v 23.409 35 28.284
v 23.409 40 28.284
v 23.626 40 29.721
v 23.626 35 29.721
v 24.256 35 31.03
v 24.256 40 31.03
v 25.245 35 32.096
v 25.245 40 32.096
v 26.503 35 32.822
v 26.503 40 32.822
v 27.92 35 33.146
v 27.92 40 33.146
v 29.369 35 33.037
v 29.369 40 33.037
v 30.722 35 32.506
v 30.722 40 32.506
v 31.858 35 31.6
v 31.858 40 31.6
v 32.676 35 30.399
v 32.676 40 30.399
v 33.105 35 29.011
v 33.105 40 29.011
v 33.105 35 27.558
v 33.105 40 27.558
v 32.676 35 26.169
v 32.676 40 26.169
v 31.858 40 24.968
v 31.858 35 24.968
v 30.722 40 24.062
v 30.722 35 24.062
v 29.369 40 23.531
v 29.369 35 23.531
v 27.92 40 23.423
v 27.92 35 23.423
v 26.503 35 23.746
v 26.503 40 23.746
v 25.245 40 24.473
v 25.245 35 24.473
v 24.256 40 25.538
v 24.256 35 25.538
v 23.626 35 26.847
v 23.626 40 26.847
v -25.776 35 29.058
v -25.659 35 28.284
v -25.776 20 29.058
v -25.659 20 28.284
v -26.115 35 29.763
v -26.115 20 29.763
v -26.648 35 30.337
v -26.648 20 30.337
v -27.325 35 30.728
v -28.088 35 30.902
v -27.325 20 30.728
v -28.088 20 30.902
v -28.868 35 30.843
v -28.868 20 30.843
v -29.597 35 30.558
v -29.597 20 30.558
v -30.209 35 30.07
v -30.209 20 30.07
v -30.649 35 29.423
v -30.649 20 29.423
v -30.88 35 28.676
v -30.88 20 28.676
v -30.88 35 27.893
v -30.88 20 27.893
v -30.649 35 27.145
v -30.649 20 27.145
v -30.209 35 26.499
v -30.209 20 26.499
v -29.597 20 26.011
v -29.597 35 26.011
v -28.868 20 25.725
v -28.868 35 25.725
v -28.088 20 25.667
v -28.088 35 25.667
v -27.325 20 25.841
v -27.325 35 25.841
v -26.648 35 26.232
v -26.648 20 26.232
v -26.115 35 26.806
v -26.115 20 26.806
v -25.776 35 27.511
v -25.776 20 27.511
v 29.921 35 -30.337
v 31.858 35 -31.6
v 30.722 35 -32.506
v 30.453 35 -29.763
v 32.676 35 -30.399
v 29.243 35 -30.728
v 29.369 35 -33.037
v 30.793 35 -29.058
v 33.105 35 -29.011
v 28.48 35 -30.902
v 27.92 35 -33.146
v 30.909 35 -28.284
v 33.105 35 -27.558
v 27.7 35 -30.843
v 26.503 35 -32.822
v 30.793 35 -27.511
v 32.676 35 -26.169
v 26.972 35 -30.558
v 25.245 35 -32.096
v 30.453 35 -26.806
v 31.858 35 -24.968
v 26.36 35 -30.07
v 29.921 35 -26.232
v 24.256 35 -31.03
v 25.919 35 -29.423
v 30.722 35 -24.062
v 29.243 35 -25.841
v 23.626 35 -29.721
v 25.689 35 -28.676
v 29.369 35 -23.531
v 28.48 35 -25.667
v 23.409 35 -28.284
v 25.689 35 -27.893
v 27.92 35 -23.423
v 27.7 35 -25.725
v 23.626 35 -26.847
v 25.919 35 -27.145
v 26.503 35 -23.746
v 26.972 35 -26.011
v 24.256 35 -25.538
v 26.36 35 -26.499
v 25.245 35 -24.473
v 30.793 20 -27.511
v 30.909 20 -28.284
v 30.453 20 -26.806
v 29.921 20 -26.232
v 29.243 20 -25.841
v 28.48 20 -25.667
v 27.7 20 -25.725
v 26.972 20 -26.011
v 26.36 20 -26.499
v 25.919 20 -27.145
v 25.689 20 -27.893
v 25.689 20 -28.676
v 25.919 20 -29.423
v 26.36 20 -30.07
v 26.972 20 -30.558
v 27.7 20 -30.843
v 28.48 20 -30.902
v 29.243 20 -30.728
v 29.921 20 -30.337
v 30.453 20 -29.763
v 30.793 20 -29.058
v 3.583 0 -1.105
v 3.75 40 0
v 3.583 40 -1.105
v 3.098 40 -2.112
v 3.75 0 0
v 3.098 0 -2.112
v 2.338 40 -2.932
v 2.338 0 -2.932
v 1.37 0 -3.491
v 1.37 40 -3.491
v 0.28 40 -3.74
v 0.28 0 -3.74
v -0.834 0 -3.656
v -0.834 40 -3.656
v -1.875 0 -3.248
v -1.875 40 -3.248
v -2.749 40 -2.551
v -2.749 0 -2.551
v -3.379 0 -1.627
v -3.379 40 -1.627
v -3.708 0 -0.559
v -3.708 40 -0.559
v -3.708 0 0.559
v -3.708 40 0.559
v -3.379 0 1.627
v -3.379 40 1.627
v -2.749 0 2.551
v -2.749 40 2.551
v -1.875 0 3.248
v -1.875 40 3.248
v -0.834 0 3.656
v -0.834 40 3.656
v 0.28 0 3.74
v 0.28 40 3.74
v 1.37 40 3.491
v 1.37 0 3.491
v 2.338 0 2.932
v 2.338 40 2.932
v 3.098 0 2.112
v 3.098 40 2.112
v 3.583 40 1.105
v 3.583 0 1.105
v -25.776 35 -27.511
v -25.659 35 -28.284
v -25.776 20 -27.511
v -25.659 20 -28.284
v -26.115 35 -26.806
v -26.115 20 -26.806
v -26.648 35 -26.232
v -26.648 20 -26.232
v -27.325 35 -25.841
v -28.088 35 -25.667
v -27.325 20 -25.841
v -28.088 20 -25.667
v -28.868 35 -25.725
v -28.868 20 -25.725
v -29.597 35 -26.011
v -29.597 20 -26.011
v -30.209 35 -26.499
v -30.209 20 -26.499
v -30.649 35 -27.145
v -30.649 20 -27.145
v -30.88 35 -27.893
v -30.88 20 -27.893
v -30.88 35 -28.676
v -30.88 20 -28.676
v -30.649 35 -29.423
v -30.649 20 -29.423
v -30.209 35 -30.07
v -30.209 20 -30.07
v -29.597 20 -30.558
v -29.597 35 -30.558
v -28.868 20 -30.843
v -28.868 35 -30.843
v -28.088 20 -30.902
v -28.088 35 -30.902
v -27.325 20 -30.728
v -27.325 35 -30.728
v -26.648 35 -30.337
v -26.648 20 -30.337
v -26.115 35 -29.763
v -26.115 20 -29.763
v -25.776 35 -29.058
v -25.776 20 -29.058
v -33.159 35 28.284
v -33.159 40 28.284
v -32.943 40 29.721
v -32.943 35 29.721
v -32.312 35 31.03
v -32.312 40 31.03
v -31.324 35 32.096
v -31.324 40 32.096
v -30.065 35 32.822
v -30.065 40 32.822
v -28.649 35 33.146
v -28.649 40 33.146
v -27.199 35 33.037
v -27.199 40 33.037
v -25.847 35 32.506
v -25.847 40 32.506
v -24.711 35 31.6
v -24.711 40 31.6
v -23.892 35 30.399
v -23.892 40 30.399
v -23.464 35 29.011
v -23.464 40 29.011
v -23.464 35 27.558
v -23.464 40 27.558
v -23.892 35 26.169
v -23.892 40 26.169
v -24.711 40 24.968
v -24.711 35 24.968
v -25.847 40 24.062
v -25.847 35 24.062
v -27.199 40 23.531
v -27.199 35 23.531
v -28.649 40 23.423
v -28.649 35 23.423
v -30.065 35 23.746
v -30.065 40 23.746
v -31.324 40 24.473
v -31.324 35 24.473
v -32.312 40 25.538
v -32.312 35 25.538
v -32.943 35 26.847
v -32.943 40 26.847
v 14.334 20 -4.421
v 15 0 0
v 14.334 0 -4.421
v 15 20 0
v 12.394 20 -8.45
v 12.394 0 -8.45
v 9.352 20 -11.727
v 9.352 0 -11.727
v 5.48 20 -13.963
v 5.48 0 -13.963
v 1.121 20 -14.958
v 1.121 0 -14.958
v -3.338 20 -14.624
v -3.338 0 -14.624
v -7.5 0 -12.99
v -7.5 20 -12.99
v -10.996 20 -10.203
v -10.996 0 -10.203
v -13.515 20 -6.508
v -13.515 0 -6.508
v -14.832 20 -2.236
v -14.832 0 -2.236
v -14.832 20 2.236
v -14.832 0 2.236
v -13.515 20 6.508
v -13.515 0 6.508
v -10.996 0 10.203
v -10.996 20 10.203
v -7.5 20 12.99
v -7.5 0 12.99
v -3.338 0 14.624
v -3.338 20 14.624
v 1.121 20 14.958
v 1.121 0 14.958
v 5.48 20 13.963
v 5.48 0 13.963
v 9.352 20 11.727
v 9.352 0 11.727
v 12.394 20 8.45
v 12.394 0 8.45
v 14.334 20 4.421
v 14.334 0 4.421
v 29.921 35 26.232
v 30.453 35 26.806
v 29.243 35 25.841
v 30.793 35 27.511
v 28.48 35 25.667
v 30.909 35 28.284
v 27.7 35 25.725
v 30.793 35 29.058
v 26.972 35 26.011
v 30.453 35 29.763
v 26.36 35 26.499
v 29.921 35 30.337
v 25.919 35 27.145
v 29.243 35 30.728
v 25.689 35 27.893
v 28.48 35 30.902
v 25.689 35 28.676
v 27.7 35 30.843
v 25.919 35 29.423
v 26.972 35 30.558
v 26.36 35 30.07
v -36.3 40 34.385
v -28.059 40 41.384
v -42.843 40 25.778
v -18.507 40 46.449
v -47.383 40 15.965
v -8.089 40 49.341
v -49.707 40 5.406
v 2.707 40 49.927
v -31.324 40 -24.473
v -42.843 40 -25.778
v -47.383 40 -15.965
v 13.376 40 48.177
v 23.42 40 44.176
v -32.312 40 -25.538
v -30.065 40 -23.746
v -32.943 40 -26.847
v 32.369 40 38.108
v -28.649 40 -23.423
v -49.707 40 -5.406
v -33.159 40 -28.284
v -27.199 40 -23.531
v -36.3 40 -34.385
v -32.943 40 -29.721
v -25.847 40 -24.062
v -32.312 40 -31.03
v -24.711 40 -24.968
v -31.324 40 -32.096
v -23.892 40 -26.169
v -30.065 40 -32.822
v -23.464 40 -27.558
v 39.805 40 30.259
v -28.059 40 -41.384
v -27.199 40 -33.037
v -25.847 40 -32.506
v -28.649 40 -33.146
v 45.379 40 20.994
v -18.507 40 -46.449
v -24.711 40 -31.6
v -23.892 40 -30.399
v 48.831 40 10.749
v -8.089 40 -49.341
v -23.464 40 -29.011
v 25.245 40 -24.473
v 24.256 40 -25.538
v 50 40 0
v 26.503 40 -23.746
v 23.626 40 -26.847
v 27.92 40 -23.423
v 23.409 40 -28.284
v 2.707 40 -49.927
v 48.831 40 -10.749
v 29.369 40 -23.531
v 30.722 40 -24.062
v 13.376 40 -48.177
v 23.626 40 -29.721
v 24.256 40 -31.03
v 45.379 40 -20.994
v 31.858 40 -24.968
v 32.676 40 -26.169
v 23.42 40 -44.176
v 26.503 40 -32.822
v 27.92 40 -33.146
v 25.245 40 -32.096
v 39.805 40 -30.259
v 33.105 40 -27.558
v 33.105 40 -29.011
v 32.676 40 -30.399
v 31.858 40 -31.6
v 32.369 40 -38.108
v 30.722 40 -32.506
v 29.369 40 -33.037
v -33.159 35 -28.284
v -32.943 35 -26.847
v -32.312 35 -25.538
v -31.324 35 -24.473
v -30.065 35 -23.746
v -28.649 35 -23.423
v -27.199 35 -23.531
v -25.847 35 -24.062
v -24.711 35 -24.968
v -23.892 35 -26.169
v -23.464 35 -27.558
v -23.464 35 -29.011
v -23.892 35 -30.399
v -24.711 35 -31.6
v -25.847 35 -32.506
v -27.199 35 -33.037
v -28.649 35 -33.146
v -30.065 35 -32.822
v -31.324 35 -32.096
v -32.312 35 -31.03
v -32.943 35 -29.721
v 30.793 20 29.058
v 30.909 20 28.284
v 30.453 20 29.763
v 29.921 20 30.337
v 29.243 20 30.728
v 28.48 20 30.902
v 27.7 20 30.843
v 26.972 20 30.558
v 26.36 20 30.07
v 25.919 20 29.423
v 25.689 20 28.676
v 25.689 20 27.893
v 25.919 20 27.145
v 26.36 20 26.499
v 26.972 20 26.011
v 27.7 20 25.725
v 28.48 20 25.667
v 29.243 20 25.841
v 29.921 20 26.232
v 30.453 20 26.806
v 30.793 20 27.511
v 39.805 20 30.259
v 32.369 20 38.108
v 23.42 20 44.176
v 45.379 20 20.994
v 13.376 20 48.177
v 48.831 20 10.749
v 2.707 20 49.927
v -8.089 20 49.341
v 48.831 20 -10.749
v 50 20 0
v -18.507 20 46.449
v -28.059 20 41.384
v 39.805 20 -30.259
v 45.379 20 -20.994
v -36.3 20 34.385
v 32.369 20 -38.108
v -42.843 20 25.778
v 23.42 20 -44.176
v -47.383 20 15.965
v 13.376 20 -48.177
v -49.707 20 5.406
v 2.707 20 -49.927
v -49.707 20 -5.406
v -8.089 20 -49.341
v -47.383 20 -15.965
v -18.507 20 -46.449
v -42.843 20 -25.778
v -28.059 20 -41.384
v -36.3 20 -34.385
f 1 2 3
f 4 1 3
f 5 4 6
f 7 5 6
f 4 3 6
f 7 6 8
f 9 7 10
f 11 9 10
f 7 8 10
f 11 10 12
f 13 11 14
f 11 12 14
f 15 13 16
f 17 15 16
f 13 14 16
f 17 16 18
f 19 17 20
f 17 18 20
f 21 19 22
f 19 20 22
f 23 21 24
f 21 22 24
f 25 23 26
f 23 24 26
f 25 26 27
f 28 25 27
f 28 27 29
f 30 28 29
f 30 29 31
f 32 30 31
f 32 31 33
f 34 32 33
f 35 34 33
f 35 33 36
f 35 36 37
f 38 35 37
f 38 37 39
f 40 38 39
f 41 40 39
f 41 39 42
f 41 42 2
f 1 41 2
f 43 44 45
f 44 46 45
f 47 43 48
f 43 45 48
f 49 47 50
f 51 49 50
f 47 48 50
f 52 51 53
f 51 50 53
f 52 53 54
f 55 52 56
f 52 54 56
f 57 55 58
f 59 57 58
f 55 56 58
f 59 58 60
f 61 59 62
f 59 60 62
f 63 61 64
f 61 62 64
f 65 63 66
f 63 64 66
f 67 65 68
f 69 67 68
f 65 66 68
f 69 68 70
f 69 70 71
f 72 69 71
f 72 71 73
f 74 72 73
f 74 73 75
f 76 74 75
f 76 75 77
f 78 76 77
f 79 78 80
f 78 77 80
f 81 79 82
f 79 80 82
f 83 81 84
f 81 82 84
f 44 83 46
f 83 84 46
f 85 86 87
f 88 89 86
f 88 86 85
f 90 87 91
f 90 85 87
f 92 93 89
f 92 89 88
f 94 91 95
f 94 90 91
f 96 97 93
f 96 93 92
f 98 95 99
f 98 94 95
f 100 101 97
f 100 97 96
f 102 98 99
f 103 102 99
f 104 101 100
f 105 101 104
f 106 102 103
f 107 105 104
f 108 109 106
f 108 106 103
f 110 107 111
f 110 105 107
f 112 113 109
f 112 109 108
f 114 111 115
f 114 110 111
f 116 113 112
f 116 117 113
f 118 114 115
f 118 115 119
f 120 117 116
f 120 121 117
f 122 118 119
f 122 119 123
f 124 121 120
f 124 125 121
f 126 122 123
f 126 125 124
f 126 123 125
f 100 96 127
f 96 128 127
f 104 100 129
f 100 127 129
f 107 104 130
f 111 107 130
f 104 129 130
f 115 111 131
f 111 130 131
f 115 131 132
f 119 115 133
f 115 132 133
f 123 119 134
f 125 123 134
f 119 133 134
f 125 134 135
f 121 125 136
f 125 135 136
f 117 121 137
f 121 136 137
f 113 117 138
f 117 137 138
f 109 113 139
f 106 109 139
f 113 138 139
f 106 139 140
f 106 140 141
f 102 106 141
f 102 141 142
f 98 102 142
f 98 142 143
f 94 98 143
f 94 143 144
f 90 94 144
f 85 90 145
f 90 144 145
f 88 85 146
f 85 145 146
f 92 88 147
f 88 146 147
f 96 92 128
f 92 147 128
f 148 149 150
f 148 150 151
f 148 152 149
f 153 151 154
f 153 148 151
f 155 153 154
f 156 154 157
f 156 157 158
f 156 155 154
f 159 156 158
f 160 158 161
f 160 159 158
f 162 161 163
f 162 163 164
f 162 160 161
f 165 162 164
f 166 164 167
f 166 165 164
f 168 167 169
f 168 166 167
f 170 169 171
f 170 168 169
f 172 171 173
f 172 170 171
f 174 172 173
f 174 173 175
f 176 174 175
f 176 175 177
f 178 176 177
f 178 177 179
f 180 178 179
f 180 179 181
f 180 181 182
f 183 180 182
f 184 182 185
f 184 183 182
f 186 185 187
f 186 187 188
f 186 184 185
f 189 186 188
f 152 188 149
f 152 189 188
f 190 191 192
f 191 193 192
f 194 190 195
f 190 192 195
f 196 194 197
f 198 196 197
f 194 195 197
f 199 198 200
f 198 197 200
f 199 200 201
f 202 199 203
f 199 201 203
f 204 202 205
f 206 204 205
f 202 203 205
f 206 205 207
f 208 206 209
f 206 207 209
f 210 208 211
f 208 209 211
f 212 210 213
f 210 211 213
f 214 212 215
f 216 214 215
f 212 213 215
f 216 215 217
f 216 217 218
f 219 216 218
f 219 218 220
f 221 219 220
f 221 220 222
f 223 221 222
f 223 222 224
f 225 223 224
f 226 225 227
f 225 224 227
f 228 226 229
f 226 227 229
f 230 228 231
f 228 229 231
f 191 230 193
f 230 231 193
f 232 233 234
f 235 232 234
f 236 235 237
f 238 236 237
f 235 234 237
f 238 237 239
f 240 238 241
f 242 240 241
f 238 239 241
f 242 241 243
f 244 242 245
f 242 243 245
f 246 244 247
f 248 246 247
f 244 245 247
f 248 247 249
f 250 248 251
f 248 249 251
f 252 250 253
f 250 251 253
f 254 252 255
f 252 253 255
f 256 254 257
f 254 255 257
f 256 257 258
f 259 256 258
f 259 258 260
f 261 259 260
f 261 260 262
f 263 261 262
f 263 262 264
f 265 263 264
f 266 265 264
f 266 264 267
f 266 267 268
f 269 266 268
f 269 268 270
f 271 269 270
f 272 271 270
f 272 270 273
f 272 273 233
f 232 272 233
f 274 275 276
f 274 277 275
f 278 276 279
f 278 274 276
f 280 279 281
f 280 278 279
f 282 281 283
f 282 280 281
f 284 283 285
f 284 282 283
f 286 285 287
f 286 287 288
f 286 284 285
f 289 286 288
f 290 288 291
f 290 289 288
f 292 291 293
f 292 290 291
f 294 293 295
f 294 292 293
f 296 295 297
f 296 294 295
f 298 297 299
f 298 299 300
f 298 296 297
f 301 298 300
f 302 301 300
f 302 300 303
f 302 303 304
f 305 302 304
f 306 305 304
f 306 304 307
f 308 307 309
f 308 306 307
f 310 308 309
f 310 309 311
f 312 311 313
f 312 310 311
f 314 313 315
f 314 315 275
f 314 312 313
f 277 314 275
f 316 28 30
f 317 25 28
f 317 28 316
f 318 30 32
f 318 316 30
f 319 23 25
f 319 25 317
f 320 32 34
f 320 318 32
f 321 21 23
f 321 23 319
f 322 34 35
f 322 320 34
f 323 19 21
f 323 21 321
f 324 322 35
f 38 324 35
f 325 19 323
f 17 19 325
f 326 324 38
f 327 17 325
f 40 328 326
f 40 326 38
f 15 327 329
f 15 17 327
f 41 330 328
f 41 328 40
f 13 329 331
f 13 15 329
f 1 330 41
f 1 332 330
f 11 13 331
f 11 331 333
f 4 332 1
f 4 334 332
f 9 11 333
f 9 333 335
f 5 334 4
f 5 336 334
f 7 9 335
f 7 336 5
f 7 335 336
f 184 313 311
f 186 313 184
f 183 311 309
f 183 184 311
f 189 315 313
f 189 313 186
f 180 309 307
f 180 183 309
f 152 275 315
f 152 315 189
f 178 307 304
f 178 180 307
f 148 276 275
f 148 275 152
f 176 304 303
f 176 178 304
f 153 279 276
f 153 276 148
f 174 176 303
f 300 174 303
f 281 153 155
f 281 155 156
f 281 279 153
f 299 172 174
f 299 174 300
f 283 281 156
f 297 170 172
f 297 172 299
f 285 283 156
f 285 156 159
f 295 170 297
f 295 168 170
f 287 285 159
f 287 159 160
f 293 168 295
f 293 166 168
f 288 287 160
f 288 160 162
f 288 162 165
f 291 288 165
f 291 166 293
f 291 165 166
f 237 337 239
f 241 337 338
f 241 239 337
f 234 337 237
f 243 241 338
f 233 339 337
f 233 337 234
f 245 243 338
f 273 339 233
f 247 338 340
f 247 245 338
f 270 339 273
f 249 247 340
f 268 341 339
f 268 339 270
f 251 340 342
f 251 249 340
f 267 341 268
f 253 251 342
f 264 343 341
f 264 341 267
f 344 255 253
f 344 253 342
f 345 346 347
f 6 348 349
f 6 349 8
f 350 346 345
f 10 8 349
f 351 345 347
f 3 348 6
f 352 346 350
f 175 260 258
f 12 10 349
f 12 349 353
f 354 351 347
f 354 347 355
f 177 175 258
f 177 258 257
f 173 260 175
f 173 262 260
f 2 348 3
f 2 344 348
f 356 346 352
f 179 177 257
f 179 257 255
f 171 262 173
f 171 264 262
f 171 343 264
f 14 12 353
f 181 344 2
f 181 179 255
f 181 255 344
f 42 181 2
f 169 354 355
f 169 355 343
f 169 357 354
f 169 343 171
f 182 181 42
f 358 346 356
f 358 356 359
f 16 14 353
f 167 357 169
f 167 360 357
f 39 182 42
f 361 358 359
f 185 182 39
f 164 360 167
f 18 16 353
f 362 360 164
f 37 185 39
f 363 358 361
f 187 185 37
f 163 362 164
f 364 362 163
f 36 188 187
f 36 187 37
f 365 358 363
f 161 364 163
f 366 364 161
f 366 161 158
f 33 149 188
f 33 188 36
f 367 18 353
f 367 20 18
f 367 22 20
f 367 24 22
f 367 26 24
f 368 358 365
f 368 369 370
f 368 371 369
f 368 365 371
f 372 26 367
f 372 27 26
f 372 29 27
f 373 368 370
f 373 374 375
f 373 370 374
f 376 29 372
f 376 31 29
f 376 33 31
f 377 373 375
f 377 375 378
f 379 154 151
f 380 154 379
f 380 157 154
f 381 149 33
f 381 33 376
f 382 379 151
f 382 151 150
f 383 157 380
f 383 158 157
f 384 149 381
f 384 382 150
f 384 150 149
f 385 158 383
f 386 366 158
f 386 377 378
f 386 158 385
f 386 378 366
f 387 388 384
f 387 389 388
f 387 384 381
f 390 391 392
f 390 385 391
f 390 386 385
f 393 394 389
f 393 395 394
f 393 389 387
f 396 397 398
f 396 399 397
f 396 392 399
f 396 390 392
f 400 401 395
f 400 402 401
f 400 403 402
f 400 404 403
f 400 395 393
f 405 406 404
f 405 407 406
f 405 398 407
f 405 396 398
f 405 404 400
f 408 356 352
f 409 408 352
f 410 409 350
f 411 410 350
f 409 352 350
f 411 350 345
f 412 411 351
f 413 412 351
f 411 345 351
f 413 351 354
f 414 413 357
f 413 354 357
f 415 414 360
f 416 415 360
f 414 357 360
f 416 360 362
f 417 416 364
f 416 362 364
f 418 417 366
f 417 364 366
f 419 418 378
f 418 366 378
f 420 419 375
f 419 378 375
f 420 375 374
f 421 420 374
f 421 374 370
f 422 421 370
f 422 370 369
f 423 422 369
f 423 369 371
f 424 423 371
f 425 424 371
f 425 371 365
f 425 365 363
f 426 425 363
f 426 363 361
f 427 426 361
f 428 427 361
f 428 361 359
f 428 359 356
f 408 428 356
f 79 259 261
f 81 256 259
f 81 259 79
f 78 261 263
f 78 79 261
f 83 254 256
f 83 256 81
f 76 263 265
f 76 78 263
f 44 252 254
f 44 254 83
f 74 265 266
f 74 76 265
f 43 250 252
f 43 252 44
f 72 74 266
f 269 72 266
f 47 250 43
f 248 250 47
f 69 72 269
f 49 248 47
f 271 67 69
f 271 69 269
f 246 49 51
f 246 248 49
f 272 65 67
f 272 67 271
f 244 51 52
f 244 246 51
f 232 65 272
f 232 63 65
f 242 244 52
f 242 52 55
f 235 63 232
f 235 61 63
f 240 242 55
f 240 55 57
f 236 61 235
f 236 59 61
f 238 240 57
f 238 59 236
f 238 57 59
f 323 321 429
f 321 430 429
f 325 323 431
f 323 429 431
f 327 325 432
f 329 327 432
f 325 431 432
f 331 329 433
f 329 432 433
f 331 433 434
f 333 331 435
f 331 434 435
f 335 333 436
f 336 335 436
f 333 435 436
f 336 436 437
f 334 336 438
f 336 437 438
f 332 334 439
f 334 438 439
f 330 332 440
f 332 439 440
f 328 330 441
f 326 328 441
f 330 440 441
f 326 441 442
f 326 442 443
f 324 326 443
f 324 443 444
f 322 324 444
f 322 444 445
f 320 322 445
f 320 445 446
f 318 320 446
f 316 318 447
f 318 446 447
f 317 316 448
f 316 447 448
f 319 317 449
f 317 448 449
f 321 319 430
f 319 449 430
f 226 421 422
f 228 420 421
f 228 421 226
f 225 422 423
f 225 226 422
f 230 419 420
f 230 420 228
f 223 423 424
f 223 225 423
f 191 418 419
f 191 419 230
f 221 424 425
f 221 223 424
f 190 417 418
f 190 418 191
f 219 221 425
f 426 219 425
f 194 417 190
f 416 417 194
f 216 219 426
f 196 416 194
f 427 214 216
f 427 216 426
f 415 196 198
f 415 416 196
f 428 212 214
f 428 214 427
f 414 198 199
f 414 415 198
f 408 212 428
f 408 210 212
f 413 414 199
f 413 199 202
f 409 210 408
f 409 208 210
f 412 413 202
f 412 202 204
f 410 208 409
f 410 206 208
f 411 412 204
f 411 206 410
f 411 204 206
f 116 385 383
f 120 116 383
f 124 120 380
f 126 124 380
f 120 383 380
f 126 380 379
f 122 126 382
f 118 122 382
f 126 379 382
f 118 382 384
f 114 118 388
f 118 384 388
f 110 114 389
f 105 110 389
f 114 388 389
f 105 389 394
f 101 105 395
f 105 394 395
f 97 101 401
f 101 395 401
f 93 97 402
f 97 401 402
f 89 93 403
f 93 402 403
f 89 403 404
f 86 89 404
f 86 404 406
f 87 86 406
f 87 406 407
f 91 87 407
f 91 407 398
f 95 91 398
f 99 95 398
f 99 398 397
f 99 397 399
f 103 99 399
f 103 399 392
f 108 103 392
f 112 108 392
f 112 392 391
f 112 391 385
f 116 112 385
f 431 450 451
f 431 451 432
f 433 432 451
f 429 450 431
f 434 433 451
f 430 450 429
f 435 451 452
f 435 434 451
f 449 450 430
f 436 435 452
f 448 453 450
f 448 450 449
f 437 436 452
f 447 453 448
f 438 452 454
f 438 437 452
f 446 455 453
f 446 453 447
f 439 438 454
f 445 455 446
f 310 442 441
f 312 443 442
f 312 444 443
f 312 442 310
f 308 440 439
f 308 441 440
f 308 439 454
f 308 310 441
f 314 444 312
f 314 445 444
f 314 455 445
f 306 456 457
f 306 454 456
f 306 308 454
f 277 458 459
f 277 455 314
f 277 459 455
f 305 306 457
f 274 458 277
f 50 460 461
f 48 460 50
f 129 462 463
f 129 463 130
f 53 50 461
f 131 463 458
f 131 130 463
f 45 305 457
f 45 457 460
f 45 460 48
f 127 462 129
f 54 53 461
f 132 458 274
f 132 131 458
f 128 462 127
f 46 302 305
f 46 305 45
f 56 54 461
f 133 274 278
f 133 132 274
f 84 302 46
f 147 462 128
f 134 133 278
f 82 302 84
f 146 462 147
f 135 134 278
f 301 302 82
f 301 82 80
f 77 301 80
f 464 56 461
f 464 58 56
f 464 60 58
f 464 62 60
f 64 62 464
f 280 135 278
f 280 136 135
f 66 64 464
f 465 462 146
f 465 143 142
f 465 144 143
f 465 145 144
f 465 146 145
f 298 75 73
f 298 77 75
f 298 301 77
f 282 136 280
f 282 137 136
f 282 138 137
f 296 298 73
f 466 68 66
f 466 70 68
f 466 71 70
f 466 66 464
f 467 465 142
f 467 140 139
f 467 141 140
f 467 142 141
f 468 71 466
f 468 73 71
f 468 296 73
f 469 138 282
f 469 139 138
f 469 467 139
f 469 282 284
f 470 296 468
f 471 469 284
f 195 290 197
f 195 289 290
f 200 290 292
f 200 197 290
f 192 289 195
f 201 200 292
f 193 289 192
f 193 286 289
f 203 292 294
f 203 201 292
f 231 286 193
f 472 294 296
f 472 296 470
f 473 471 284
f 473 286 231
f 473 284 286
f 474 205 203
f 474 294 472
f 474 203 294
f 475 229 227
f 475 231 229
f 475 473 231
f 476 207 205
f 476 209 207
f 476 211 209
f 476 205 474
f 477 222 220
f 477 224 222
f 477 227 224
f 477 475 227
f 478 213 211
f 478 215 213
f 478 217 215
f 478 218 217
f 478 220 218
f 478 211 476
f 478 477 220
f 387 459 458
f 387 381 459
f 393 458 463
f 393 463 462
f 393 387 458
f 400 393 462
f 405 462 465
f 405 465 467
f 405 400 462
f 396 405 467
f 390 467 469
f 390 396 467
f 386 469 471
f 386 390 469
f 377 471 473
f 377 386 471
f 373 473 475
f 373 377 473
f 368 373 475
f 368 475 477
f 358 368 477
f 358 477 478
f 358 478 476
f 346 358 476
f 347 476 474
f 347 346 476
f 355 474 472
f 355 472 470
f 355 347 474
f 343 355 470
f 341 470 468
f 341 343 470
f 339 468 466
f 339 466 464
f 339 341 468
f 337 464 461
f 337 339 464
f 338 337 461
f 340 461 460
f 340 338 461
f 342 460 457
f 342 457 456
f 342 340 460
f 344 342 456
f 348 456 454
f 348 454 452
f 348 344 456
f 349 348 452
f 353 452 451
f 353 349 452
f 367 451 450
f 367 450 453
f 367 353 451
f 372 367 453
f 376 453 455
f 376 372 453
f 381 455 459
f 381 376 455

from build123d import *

# Parameters (mm, degrees)
F3_D           = 5.25
F3_CBORE_D     = 9.75
F3_CBORE_DEPTH = 5


with BuildPart() as f1:
    # F0 (on Top) → F1 (revolve)
    with BuildSketch(Plane.XY):
        Polygon((50, 20), (50, 40), (3.75, 40), (3.75, 0), (15, 0), (15, 20), align=None)
    revolve(axis=Axis((0, 20, 0), (0, 1, 0)))

    # F3 (through all)
    with Locations(Plane(origin=(0, 40, 0), x_dir=(-1, 0, 0), z_dir=(0, 1, 0))):
        with Locations((-28.2842712475, 28.2842712475), (28.2842712475, 28.2842712475), (-28.2842712475, -28.2842712475), (28.2842712475, -28.2842712475)):
            CounterBoreHole(F3_D / 2, F3_CBORE_D / 2, F3_CBORE_DEPTH)


solid = f1.part
